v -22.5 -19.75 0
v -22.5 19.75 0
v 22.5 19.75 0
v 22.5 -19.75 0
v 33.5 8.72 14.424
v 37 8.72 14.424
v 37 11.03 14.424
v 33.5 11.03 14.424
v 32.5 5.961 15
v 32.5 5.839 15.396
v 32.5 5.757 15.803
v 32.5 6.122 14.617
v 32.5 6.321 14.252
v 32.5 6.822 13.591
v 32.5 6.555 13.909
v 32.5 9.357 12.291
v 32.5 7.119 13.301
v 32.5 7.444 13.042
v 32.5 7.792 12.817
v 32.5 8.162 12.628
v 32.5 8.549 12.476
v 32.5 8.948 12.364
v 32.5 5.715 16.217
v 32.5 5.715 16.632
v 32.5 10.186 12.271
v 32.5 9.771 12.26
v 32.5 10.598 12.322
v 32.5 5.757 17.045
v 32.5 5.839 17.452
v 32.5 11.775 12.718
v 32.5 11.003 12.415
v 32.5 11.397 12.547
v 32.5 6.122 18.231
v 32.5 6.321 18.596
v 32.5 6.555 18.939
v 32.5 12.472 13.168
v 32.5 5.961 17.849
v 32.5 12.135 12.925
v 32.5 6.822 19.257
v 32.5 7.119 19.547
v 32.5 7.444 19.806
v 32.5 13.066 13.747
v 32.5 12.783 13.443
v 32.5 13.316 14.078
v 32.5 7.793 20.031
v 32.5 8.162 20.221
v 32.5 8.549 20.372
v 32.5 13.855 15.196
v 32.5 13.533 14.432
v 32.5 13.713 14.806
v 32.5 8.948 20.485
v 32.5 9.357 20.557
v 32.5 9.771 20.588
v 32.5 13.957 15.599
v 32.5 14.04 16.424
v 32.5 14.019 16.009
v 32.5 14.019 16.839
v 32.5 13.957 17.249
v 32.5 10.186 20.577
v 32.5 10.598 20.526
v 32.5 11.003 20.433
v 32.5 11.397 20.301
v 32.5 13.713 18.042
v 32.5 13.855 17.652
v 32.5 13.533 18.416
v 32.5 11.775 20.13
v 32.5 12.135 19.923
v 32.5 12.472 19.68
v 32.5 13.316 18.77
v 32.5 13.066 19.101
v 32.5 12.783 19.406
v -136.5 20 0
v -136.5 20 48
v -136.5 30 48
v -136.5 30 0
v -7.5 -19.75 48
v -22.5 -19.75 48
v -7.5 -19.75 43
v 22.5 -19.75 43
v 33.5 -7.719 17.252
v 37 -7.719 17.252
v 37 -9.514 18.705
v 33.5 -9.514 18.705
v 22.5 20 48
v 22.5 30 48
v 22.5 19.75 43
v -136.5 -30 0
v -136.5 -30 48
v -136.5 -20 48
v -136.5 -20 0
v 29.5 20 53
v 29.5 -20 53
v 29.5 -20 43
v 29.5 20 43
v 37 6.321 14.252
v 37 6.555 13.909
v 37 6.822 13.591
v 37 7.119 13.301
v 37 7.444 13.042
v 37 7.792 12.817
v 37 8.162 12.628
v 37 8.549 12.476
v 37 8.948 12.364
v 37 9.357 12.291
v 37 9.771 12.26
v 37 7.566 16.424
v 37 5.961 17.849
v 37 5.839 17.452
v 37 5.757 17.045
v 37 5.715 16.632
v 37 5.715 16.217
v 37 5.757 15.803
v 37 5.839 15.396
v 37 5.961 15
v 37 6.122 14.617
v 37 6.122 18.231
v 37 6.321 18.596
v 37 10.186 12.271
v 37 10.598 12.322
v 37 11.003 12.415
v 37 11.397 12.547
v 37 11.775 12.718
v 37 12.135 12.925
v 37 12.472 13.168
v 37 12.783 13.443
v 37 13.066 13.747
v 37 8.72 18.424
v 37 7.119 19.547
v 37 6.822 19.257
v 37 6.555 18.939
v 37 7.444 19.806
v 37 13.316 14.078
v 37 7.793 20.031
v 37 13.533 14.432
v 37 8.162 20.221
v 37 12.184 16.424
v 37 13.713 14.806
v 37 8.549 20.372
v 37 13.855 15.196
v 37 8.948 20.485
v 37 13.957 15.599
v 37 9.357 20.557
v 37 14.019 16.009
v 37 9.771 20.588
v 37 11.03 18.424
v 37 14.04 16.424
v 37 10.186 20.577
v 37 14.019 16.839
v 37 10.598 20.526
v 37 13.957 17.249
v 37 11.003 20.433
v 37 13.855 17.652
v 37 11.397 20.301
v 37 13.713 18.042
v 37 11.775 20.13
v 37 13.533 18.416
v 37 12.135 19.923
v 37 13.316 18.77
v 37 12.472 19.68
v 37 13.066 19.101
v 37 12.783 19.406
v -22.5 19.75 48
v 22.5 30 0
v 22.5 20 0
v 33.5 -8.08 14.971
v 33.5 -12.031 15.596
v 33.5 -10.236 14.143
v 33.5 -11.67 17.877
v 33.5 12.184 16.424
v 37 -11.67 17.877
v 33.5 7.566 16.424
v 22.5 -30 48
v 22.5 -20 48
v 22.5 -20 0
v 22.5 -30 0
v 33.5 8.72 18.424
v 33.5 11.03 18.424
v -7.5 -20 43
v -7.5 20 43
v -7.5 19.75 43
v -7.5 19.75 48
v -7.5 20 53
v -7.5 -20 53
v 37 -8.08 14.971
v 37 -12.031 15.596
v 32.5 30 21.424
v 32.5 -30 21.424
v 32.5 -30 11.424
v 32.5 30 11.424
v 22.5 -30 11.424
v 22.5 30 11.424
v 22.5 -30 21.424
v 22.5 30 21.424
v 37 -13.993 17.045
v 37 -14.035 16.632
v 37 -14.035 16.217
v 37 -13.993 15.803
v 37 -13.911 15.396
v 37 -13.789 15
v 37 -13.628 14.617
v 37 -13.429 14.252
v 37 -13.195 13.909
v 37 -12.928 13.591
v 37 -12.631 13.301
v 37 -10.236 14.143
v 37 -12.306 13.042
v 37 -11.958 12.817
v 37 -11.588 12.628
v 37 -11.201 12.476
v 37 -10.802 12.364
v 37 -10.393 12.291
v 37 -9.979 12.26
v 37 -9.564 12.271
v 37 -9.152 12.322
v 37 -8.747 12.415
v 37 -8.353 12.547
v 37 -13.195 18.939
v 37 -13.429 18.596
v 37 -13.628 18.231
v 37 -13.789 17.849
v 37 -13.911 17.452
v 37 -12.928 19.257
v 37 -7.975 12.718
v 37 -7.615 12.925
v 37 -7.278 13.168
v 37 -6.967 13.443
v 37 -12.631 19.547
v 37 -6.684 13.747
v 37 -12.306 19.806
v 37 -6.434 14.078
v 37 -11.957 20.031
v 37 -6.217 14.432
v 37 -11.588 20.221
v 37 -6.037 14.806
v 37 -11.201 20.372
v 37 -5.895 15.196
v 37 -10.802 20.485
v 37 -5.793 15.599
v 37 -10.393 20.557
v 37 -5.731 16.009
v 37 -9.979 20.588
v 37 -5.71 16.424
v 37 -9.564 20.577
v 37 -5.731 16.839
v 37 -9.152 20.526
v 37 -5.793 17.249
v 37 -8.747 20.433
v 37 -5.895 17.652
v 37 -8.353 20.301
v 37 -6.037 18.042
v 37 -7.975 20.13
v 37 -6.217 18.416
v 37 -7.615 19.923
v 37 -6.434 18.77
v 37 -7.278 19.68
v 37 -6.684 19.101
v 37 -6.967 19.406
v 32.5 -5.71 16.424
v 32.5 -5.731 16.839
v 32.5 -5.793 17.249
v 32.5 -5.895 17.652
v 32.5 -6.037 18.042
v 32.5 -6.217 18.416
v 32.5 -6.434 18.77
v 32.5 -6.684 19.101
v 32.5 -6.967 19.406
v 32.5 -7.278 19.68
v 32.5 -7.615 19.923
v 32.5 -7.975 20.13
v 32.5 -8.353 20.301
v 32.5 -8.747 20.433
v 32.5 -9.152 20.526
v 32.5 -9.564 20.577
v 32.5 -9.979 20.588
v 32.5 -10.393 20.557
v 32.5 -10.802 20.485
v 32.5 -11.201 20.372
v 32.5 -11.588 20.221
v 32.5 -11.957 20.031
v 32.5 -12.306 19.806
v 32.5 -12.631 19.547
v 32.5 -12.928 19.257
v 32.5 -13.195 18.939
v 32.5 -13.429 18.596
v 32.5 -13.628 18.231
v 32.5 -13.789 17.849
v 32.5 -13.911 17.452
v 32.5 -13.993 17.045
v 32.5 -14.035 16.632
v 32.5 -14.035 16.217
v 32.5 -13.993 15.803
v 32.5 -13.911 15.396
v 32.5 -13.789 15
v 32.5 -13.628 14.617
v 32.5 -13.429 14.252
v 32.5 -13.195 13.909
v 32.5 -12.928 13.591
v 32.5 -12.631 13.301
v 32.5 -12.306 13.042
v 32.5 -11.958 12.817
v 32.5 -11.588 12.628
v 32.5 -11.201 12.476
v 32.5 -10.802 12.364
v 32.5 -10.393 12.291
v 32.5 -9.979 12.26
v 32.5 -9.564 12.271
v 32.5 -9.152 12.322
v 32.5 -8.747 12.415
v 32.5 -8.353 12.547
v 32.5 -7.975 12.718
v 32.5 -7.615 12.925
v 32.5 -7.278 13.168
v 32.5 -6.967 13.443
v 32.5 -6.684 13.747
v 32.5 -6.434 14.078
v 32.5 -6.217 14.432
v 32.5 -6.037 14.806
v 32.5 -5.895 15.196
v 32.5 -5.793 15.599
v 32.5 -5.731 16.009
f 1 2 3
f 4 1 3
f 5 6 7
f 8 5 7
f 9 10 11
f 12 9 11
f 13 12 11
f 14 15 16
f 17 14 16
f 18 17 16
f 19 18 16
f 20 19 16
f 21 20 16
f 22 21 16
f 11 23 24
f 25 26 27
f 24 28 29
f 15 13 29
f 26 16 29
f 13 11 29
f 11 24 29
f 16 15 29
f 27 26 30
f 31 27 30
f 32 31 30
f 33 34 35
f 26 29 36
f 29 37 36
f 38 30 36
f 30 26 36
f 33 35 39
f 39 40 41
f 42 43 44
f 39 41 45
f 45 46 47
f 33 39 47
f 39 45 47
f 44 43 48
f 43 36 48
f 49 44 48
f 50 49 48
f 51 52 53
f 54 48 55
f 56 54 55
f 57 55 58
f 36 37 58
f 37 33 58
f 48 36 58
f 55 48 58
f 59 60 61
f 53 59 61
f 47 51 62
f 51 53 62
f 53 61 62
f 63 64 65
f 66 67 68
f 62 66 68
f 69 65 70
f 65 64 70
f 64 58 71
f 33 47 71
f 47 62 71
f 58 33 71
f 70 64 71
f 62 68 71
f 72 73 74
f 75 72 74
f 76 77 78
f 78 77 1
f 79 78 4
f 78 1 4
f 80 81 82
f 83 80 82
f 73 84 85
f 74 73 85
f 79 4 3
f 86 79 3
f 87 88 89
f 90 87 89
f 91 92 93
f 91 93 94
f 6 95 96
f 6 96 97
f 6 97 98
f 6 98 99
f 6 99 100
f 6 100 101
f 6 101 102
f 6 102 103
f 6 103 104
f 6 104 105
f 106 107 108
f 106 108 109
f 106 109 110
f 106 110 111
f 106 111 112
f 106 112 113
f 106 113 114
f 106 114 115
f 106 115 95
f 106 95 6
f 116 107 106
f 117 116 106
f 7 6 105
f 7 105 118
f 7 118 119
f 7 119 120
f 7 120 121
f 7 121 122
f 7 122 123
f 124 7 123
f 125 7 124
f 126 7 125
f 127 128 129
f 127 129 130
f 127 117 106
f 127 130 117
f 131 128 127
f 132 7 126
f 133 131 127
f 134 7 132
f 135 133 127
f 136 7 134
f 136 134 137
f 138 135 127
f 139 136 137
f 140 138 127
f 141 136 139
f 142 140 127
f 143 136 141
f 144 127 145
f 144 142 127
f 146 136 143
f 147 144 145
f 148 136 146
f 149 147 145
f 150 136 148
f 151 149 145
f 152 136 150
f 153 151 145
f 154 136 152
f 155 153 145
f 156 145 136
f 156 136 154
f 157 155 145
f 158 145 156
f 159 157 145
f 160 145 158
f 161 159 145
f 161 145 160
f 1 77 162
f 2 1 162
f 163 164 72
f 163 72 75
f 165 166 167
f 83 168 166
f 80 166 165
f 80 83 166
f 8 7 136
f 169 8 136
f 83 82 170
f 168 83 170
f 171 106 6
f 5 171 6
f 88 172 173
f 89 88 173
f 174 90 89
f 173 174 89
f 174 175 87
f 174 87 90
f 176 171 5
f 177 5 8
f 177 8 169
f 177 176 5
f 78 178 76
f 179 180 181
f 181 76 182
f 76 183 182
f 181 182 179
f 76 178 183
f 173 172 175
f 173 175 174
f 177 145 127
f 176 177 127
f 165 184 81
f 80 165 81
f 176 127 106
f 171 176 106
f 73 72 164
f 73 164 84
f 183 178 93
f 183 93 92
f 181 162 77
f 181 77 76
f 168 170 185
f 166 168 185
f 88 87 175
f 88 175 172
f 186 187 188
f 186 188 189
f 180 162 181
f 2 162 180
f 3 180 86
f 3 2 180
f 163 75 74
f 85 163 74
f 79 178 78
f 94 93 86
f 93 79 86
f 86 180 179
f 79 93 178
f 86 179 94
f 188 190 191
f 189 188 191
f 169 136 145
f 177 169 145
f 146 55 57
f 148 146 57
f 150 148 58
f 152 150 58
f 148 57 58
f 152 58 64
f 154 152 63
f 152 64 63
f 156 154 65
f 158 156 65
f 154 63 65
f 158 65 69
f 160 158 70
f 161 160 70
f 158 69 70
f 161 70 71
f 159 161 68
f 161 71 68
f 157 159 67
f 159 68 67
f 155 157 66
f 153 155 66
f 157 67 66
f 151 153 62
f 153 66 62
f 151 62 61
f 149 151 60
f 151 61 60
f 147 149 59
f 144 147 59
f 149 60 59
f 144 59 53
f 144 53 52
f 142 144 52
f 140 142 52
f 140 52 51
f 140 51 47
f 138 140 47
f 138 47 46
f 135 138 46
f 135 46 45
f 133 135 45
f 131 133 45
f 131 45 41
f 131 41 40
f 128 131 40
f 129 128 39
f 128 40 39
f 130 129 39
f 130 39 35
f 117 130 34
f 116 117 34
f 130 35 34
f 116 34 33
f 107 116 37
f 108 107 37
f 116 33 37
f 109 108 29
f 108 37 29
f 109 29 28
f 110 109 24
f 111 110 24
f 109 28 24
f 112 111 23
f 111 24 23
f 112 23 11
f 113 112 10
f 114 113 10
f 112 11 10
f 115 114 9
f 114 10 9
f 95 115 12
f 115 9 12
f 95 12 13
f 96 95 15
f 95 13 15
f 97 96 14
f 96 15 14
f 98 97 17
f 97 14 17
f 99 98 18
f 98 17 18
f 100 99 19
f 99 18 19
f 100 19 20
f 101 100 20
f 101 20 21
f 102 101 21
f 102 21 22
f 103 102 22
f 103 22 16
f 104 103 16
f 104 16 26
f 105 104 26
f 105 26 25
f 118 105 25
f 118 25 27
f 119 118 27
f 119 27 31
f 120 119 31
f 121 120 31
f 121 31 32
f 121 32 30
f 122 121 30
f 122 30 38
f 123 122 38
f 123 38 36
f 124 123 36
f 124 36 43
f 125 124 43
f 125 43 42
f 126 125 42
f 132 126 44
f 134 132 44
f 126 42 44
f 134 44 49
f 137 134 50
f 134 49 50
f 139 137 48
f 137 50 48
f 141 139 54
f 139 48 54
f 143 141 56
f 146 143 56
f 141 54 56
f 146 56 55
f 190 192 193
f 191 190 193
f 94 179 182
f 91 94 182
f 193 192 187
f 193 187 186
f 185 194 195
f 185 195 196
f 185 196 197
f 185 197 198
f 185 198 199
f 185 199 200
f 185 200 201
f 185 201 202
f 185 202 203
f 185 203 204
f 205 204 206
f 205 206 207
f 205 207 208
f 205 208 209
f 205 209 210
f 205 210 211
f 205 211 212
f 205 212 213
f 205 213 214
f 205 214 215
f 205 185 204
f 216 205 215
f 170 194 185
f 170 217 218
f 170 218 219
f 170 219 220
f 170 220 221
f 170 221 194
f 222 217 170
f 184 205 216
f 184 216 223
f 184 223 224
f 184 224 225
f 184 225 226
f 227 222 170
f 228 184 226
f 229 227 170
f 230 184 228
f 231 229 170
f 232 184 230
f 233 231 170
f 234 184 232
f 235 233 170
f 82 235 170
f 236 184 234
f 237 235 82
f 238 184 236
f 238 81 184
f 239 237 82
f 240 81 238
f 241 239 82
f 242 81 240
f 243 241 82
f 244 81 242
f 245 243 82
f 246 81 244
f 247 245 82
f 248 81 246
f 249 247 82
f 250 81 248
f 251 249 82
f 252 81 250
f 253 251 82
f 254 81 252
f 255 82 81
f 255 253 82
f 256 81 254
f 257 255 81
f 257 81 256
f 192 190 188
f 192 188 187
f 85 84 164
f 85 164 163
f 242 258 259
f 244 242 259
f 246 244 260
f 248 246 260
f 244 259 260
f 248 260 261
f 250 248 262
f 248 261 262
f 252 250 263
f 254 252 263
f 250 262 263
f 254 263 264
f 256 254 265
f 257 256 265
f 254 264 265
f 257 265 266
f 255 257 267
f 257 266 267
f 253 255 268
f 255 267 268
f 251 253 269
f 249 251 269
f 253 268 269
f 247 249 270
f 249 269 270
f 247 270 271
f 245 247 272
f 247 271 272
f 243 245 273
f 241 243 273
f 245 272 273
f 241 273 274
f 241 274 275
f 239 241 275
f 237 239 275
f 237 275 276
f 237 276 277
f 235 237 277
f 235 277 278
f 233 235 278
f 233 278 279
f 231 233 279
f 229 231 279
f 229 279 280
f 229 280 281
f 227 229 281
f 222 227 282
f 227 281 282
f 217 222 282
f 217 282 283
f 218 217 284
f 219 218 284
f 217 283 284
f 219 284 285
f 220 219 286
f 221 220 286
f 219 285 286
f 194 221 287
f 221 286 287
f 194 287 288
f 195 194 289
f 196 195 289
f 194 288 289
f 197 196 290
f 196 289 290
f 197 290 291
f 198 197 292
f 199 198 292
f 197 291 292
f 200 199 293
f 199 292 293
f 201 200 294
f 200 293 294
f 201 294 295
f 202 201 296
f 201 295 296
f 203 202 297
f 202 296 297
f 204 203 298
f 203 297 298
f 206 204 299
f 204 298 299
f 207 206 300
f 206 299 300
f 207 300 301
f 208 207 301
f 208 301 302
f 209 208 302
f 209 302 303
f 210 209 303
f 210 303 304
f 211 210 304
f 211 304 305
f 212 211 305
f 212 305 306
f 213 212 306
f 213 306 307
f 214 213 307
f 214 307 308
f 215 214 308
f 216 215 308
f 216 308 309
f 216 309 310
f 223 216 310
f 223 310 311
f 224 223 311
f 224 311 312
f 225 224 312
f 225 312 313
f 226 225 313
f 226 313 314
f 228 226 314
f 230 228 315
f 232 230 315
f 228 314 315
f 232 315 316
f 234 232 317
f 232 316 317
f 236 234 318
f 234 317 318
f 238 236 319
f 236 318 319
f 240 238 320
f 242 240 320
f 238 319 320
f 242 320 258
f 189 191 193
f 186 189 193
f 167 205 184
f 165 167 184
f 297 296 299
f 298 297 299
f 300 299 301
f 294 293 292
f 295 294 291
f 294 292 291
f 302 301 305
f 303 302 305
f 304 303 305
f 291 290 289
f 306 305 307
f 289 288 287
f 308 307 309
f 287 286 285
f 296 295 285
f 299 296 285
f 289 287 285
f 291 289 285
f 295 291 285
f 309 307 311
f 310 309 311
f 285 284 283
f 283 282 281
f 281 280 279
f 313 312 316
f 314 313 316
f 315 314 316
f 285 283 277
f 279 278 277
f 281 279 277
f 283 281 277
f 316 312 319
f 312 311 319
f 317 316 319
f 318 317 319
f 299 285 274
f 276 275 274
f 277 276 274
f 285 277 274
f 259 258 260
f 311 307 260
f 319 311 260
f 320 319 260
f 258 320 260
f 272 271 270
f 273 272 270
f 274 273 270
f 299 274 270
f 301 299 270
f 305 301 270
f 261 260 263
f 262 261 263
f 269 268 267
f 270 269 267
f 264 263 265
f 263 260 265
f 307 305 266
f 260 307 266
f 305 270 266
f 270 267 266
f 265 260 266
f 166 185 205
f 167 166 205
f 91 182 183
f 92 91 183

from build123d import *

# Parameters (mm, degrees)
F0_W      = 45
F0_H      = 39.5
F1_DEPTH  = 43
F2_W      = 15
F2_H      = 39.5
F3_DEPTH  = 5
F4_W      = 10
F4_H      = 10
F5_DEPTH  = 37
F7_W      = 10
F7_H      = 48
F8_DEPTH  = 159
F9_W      = 60
F9_H      = 10
F10_DEPTH = 10
F12_R     = 4.165
F13_DEPTH = 4.5
F15_DEPTH = 3.5


with BuildPart() as f1:
    # F0 (on Top) → F1 (new body)
    with BuildSketch(Plane.XY):
        Rectangle(F0_W, F0_H)
    extrude(amount=F1_DEPTH)

    # F2 (on face) → F3 (join)
    with BuildSketch(Plane.XY.offset(43)):
        with Locations((-15, 0)):
            Rectangle(F2_W, F2_H)
    extrude(amount=F3_DEPTH)

    # F4 (on face) → F5 (join)
    with BuildSketch(Plane.YZ.offset(-7.5)):
        with Locations((5, 48)):
            Rectangle(F4_W, F4_H)
        with Locations((-5, 48)):
            Rectangle(F4_W, F4_H)
        with Locations((15, 48)):
            Rectangle(F4_W, F4_H)
        with Locations((-15, 48)):
            Rectangle(F4_W, F4_H)
    extrude(amount=F5_DEPTH)


with BuildPart() as f8:
    # F7 (on plane+point) → F8 (new body)
    with BuildSketch(Plane.YZ.offset(22.5)):
        with Locations((25, 24)):
            Rectangle(F7_W, F7_H)
    extrude(amount=-F8_DEPTH)


with BuildPart() as f8b:
    # F7 (on plane+point) → F8, piece 2 (new body)
    with BuildSketch(Plane.YZ.offset(22.5)):
        with Locations((-25, 24)):
            Rectangle(F7_W, F7_H)
    extrude(amount=-F8_DEPTH)


with BuildPart() as f10:
    # F9 (on face) → F10 (new body)
    with BuildSketch(Plane.YZ.offset(22.5)):
        with Locations((0, 16.4241382107)):
            Rectangle(F9_W, F9_H)
    extrude(amount=F10_DEPTH)


with BuildPart() as f13:
    # F12 (on face) → F13 (new body)
    with BuildSketch(Plane.YZ.offset(32.5)):
        with Locations((-9.875, 16.4241382107)):
            Circle(F12_R)
    extrude(amount=F13_DEPTH)


with BuildPart() as f13b:
    # F12 (on face) → F13, piece 2 (new body)
    with BuildSketch(Plane.YZ.offset(32.5)):
        with Locations((9.875, 16.4241382107)):
            Circle(F12_R)
    extrude(amount=F13_DEPTH)


with BuildPart() as f15_tool:
    # F14 (on face) → F15 (new body)
    with BuildSketch(Plane.YZ.offset(37)):
        Polygon((-10.2362294434, 14.1431632826), (-8.0802324886, 14.9708168721), (-7.7190030452, 17.2517918001), (-9.5137705566, 18.7051131388), (-11.6697675114, 17.8774595494), (-12.0309969548, 15.5964846213), align=None)
        Polygon((8.7202994616, 14.4241382107), (11.0297005384, 14.4241382107), (12.1844010768, 16.4241382107), (11.0297005384, 18.4241382107), (8.7202994616, 18.4241382107), (7.5655989232, 16.4241382107), align=None)
    extrude(amount=-F15_DEPTH)


with BuildPart() as f13_1:
    add(f13.part)

    # F15: cut by f15_tool
    add(f15_tool.part, mode=Mode.SUBTRACT)


with BuildPart() as f13b_1:
    add(f13b.part)

    # F15: cut by f15_tool
    add(f15_tool.part, mode=Mode.SUBTRACT)


solid = Compound([f1.part, f8.part, f8b.part, f10.part, f13_1.part, f13b_1.part])
